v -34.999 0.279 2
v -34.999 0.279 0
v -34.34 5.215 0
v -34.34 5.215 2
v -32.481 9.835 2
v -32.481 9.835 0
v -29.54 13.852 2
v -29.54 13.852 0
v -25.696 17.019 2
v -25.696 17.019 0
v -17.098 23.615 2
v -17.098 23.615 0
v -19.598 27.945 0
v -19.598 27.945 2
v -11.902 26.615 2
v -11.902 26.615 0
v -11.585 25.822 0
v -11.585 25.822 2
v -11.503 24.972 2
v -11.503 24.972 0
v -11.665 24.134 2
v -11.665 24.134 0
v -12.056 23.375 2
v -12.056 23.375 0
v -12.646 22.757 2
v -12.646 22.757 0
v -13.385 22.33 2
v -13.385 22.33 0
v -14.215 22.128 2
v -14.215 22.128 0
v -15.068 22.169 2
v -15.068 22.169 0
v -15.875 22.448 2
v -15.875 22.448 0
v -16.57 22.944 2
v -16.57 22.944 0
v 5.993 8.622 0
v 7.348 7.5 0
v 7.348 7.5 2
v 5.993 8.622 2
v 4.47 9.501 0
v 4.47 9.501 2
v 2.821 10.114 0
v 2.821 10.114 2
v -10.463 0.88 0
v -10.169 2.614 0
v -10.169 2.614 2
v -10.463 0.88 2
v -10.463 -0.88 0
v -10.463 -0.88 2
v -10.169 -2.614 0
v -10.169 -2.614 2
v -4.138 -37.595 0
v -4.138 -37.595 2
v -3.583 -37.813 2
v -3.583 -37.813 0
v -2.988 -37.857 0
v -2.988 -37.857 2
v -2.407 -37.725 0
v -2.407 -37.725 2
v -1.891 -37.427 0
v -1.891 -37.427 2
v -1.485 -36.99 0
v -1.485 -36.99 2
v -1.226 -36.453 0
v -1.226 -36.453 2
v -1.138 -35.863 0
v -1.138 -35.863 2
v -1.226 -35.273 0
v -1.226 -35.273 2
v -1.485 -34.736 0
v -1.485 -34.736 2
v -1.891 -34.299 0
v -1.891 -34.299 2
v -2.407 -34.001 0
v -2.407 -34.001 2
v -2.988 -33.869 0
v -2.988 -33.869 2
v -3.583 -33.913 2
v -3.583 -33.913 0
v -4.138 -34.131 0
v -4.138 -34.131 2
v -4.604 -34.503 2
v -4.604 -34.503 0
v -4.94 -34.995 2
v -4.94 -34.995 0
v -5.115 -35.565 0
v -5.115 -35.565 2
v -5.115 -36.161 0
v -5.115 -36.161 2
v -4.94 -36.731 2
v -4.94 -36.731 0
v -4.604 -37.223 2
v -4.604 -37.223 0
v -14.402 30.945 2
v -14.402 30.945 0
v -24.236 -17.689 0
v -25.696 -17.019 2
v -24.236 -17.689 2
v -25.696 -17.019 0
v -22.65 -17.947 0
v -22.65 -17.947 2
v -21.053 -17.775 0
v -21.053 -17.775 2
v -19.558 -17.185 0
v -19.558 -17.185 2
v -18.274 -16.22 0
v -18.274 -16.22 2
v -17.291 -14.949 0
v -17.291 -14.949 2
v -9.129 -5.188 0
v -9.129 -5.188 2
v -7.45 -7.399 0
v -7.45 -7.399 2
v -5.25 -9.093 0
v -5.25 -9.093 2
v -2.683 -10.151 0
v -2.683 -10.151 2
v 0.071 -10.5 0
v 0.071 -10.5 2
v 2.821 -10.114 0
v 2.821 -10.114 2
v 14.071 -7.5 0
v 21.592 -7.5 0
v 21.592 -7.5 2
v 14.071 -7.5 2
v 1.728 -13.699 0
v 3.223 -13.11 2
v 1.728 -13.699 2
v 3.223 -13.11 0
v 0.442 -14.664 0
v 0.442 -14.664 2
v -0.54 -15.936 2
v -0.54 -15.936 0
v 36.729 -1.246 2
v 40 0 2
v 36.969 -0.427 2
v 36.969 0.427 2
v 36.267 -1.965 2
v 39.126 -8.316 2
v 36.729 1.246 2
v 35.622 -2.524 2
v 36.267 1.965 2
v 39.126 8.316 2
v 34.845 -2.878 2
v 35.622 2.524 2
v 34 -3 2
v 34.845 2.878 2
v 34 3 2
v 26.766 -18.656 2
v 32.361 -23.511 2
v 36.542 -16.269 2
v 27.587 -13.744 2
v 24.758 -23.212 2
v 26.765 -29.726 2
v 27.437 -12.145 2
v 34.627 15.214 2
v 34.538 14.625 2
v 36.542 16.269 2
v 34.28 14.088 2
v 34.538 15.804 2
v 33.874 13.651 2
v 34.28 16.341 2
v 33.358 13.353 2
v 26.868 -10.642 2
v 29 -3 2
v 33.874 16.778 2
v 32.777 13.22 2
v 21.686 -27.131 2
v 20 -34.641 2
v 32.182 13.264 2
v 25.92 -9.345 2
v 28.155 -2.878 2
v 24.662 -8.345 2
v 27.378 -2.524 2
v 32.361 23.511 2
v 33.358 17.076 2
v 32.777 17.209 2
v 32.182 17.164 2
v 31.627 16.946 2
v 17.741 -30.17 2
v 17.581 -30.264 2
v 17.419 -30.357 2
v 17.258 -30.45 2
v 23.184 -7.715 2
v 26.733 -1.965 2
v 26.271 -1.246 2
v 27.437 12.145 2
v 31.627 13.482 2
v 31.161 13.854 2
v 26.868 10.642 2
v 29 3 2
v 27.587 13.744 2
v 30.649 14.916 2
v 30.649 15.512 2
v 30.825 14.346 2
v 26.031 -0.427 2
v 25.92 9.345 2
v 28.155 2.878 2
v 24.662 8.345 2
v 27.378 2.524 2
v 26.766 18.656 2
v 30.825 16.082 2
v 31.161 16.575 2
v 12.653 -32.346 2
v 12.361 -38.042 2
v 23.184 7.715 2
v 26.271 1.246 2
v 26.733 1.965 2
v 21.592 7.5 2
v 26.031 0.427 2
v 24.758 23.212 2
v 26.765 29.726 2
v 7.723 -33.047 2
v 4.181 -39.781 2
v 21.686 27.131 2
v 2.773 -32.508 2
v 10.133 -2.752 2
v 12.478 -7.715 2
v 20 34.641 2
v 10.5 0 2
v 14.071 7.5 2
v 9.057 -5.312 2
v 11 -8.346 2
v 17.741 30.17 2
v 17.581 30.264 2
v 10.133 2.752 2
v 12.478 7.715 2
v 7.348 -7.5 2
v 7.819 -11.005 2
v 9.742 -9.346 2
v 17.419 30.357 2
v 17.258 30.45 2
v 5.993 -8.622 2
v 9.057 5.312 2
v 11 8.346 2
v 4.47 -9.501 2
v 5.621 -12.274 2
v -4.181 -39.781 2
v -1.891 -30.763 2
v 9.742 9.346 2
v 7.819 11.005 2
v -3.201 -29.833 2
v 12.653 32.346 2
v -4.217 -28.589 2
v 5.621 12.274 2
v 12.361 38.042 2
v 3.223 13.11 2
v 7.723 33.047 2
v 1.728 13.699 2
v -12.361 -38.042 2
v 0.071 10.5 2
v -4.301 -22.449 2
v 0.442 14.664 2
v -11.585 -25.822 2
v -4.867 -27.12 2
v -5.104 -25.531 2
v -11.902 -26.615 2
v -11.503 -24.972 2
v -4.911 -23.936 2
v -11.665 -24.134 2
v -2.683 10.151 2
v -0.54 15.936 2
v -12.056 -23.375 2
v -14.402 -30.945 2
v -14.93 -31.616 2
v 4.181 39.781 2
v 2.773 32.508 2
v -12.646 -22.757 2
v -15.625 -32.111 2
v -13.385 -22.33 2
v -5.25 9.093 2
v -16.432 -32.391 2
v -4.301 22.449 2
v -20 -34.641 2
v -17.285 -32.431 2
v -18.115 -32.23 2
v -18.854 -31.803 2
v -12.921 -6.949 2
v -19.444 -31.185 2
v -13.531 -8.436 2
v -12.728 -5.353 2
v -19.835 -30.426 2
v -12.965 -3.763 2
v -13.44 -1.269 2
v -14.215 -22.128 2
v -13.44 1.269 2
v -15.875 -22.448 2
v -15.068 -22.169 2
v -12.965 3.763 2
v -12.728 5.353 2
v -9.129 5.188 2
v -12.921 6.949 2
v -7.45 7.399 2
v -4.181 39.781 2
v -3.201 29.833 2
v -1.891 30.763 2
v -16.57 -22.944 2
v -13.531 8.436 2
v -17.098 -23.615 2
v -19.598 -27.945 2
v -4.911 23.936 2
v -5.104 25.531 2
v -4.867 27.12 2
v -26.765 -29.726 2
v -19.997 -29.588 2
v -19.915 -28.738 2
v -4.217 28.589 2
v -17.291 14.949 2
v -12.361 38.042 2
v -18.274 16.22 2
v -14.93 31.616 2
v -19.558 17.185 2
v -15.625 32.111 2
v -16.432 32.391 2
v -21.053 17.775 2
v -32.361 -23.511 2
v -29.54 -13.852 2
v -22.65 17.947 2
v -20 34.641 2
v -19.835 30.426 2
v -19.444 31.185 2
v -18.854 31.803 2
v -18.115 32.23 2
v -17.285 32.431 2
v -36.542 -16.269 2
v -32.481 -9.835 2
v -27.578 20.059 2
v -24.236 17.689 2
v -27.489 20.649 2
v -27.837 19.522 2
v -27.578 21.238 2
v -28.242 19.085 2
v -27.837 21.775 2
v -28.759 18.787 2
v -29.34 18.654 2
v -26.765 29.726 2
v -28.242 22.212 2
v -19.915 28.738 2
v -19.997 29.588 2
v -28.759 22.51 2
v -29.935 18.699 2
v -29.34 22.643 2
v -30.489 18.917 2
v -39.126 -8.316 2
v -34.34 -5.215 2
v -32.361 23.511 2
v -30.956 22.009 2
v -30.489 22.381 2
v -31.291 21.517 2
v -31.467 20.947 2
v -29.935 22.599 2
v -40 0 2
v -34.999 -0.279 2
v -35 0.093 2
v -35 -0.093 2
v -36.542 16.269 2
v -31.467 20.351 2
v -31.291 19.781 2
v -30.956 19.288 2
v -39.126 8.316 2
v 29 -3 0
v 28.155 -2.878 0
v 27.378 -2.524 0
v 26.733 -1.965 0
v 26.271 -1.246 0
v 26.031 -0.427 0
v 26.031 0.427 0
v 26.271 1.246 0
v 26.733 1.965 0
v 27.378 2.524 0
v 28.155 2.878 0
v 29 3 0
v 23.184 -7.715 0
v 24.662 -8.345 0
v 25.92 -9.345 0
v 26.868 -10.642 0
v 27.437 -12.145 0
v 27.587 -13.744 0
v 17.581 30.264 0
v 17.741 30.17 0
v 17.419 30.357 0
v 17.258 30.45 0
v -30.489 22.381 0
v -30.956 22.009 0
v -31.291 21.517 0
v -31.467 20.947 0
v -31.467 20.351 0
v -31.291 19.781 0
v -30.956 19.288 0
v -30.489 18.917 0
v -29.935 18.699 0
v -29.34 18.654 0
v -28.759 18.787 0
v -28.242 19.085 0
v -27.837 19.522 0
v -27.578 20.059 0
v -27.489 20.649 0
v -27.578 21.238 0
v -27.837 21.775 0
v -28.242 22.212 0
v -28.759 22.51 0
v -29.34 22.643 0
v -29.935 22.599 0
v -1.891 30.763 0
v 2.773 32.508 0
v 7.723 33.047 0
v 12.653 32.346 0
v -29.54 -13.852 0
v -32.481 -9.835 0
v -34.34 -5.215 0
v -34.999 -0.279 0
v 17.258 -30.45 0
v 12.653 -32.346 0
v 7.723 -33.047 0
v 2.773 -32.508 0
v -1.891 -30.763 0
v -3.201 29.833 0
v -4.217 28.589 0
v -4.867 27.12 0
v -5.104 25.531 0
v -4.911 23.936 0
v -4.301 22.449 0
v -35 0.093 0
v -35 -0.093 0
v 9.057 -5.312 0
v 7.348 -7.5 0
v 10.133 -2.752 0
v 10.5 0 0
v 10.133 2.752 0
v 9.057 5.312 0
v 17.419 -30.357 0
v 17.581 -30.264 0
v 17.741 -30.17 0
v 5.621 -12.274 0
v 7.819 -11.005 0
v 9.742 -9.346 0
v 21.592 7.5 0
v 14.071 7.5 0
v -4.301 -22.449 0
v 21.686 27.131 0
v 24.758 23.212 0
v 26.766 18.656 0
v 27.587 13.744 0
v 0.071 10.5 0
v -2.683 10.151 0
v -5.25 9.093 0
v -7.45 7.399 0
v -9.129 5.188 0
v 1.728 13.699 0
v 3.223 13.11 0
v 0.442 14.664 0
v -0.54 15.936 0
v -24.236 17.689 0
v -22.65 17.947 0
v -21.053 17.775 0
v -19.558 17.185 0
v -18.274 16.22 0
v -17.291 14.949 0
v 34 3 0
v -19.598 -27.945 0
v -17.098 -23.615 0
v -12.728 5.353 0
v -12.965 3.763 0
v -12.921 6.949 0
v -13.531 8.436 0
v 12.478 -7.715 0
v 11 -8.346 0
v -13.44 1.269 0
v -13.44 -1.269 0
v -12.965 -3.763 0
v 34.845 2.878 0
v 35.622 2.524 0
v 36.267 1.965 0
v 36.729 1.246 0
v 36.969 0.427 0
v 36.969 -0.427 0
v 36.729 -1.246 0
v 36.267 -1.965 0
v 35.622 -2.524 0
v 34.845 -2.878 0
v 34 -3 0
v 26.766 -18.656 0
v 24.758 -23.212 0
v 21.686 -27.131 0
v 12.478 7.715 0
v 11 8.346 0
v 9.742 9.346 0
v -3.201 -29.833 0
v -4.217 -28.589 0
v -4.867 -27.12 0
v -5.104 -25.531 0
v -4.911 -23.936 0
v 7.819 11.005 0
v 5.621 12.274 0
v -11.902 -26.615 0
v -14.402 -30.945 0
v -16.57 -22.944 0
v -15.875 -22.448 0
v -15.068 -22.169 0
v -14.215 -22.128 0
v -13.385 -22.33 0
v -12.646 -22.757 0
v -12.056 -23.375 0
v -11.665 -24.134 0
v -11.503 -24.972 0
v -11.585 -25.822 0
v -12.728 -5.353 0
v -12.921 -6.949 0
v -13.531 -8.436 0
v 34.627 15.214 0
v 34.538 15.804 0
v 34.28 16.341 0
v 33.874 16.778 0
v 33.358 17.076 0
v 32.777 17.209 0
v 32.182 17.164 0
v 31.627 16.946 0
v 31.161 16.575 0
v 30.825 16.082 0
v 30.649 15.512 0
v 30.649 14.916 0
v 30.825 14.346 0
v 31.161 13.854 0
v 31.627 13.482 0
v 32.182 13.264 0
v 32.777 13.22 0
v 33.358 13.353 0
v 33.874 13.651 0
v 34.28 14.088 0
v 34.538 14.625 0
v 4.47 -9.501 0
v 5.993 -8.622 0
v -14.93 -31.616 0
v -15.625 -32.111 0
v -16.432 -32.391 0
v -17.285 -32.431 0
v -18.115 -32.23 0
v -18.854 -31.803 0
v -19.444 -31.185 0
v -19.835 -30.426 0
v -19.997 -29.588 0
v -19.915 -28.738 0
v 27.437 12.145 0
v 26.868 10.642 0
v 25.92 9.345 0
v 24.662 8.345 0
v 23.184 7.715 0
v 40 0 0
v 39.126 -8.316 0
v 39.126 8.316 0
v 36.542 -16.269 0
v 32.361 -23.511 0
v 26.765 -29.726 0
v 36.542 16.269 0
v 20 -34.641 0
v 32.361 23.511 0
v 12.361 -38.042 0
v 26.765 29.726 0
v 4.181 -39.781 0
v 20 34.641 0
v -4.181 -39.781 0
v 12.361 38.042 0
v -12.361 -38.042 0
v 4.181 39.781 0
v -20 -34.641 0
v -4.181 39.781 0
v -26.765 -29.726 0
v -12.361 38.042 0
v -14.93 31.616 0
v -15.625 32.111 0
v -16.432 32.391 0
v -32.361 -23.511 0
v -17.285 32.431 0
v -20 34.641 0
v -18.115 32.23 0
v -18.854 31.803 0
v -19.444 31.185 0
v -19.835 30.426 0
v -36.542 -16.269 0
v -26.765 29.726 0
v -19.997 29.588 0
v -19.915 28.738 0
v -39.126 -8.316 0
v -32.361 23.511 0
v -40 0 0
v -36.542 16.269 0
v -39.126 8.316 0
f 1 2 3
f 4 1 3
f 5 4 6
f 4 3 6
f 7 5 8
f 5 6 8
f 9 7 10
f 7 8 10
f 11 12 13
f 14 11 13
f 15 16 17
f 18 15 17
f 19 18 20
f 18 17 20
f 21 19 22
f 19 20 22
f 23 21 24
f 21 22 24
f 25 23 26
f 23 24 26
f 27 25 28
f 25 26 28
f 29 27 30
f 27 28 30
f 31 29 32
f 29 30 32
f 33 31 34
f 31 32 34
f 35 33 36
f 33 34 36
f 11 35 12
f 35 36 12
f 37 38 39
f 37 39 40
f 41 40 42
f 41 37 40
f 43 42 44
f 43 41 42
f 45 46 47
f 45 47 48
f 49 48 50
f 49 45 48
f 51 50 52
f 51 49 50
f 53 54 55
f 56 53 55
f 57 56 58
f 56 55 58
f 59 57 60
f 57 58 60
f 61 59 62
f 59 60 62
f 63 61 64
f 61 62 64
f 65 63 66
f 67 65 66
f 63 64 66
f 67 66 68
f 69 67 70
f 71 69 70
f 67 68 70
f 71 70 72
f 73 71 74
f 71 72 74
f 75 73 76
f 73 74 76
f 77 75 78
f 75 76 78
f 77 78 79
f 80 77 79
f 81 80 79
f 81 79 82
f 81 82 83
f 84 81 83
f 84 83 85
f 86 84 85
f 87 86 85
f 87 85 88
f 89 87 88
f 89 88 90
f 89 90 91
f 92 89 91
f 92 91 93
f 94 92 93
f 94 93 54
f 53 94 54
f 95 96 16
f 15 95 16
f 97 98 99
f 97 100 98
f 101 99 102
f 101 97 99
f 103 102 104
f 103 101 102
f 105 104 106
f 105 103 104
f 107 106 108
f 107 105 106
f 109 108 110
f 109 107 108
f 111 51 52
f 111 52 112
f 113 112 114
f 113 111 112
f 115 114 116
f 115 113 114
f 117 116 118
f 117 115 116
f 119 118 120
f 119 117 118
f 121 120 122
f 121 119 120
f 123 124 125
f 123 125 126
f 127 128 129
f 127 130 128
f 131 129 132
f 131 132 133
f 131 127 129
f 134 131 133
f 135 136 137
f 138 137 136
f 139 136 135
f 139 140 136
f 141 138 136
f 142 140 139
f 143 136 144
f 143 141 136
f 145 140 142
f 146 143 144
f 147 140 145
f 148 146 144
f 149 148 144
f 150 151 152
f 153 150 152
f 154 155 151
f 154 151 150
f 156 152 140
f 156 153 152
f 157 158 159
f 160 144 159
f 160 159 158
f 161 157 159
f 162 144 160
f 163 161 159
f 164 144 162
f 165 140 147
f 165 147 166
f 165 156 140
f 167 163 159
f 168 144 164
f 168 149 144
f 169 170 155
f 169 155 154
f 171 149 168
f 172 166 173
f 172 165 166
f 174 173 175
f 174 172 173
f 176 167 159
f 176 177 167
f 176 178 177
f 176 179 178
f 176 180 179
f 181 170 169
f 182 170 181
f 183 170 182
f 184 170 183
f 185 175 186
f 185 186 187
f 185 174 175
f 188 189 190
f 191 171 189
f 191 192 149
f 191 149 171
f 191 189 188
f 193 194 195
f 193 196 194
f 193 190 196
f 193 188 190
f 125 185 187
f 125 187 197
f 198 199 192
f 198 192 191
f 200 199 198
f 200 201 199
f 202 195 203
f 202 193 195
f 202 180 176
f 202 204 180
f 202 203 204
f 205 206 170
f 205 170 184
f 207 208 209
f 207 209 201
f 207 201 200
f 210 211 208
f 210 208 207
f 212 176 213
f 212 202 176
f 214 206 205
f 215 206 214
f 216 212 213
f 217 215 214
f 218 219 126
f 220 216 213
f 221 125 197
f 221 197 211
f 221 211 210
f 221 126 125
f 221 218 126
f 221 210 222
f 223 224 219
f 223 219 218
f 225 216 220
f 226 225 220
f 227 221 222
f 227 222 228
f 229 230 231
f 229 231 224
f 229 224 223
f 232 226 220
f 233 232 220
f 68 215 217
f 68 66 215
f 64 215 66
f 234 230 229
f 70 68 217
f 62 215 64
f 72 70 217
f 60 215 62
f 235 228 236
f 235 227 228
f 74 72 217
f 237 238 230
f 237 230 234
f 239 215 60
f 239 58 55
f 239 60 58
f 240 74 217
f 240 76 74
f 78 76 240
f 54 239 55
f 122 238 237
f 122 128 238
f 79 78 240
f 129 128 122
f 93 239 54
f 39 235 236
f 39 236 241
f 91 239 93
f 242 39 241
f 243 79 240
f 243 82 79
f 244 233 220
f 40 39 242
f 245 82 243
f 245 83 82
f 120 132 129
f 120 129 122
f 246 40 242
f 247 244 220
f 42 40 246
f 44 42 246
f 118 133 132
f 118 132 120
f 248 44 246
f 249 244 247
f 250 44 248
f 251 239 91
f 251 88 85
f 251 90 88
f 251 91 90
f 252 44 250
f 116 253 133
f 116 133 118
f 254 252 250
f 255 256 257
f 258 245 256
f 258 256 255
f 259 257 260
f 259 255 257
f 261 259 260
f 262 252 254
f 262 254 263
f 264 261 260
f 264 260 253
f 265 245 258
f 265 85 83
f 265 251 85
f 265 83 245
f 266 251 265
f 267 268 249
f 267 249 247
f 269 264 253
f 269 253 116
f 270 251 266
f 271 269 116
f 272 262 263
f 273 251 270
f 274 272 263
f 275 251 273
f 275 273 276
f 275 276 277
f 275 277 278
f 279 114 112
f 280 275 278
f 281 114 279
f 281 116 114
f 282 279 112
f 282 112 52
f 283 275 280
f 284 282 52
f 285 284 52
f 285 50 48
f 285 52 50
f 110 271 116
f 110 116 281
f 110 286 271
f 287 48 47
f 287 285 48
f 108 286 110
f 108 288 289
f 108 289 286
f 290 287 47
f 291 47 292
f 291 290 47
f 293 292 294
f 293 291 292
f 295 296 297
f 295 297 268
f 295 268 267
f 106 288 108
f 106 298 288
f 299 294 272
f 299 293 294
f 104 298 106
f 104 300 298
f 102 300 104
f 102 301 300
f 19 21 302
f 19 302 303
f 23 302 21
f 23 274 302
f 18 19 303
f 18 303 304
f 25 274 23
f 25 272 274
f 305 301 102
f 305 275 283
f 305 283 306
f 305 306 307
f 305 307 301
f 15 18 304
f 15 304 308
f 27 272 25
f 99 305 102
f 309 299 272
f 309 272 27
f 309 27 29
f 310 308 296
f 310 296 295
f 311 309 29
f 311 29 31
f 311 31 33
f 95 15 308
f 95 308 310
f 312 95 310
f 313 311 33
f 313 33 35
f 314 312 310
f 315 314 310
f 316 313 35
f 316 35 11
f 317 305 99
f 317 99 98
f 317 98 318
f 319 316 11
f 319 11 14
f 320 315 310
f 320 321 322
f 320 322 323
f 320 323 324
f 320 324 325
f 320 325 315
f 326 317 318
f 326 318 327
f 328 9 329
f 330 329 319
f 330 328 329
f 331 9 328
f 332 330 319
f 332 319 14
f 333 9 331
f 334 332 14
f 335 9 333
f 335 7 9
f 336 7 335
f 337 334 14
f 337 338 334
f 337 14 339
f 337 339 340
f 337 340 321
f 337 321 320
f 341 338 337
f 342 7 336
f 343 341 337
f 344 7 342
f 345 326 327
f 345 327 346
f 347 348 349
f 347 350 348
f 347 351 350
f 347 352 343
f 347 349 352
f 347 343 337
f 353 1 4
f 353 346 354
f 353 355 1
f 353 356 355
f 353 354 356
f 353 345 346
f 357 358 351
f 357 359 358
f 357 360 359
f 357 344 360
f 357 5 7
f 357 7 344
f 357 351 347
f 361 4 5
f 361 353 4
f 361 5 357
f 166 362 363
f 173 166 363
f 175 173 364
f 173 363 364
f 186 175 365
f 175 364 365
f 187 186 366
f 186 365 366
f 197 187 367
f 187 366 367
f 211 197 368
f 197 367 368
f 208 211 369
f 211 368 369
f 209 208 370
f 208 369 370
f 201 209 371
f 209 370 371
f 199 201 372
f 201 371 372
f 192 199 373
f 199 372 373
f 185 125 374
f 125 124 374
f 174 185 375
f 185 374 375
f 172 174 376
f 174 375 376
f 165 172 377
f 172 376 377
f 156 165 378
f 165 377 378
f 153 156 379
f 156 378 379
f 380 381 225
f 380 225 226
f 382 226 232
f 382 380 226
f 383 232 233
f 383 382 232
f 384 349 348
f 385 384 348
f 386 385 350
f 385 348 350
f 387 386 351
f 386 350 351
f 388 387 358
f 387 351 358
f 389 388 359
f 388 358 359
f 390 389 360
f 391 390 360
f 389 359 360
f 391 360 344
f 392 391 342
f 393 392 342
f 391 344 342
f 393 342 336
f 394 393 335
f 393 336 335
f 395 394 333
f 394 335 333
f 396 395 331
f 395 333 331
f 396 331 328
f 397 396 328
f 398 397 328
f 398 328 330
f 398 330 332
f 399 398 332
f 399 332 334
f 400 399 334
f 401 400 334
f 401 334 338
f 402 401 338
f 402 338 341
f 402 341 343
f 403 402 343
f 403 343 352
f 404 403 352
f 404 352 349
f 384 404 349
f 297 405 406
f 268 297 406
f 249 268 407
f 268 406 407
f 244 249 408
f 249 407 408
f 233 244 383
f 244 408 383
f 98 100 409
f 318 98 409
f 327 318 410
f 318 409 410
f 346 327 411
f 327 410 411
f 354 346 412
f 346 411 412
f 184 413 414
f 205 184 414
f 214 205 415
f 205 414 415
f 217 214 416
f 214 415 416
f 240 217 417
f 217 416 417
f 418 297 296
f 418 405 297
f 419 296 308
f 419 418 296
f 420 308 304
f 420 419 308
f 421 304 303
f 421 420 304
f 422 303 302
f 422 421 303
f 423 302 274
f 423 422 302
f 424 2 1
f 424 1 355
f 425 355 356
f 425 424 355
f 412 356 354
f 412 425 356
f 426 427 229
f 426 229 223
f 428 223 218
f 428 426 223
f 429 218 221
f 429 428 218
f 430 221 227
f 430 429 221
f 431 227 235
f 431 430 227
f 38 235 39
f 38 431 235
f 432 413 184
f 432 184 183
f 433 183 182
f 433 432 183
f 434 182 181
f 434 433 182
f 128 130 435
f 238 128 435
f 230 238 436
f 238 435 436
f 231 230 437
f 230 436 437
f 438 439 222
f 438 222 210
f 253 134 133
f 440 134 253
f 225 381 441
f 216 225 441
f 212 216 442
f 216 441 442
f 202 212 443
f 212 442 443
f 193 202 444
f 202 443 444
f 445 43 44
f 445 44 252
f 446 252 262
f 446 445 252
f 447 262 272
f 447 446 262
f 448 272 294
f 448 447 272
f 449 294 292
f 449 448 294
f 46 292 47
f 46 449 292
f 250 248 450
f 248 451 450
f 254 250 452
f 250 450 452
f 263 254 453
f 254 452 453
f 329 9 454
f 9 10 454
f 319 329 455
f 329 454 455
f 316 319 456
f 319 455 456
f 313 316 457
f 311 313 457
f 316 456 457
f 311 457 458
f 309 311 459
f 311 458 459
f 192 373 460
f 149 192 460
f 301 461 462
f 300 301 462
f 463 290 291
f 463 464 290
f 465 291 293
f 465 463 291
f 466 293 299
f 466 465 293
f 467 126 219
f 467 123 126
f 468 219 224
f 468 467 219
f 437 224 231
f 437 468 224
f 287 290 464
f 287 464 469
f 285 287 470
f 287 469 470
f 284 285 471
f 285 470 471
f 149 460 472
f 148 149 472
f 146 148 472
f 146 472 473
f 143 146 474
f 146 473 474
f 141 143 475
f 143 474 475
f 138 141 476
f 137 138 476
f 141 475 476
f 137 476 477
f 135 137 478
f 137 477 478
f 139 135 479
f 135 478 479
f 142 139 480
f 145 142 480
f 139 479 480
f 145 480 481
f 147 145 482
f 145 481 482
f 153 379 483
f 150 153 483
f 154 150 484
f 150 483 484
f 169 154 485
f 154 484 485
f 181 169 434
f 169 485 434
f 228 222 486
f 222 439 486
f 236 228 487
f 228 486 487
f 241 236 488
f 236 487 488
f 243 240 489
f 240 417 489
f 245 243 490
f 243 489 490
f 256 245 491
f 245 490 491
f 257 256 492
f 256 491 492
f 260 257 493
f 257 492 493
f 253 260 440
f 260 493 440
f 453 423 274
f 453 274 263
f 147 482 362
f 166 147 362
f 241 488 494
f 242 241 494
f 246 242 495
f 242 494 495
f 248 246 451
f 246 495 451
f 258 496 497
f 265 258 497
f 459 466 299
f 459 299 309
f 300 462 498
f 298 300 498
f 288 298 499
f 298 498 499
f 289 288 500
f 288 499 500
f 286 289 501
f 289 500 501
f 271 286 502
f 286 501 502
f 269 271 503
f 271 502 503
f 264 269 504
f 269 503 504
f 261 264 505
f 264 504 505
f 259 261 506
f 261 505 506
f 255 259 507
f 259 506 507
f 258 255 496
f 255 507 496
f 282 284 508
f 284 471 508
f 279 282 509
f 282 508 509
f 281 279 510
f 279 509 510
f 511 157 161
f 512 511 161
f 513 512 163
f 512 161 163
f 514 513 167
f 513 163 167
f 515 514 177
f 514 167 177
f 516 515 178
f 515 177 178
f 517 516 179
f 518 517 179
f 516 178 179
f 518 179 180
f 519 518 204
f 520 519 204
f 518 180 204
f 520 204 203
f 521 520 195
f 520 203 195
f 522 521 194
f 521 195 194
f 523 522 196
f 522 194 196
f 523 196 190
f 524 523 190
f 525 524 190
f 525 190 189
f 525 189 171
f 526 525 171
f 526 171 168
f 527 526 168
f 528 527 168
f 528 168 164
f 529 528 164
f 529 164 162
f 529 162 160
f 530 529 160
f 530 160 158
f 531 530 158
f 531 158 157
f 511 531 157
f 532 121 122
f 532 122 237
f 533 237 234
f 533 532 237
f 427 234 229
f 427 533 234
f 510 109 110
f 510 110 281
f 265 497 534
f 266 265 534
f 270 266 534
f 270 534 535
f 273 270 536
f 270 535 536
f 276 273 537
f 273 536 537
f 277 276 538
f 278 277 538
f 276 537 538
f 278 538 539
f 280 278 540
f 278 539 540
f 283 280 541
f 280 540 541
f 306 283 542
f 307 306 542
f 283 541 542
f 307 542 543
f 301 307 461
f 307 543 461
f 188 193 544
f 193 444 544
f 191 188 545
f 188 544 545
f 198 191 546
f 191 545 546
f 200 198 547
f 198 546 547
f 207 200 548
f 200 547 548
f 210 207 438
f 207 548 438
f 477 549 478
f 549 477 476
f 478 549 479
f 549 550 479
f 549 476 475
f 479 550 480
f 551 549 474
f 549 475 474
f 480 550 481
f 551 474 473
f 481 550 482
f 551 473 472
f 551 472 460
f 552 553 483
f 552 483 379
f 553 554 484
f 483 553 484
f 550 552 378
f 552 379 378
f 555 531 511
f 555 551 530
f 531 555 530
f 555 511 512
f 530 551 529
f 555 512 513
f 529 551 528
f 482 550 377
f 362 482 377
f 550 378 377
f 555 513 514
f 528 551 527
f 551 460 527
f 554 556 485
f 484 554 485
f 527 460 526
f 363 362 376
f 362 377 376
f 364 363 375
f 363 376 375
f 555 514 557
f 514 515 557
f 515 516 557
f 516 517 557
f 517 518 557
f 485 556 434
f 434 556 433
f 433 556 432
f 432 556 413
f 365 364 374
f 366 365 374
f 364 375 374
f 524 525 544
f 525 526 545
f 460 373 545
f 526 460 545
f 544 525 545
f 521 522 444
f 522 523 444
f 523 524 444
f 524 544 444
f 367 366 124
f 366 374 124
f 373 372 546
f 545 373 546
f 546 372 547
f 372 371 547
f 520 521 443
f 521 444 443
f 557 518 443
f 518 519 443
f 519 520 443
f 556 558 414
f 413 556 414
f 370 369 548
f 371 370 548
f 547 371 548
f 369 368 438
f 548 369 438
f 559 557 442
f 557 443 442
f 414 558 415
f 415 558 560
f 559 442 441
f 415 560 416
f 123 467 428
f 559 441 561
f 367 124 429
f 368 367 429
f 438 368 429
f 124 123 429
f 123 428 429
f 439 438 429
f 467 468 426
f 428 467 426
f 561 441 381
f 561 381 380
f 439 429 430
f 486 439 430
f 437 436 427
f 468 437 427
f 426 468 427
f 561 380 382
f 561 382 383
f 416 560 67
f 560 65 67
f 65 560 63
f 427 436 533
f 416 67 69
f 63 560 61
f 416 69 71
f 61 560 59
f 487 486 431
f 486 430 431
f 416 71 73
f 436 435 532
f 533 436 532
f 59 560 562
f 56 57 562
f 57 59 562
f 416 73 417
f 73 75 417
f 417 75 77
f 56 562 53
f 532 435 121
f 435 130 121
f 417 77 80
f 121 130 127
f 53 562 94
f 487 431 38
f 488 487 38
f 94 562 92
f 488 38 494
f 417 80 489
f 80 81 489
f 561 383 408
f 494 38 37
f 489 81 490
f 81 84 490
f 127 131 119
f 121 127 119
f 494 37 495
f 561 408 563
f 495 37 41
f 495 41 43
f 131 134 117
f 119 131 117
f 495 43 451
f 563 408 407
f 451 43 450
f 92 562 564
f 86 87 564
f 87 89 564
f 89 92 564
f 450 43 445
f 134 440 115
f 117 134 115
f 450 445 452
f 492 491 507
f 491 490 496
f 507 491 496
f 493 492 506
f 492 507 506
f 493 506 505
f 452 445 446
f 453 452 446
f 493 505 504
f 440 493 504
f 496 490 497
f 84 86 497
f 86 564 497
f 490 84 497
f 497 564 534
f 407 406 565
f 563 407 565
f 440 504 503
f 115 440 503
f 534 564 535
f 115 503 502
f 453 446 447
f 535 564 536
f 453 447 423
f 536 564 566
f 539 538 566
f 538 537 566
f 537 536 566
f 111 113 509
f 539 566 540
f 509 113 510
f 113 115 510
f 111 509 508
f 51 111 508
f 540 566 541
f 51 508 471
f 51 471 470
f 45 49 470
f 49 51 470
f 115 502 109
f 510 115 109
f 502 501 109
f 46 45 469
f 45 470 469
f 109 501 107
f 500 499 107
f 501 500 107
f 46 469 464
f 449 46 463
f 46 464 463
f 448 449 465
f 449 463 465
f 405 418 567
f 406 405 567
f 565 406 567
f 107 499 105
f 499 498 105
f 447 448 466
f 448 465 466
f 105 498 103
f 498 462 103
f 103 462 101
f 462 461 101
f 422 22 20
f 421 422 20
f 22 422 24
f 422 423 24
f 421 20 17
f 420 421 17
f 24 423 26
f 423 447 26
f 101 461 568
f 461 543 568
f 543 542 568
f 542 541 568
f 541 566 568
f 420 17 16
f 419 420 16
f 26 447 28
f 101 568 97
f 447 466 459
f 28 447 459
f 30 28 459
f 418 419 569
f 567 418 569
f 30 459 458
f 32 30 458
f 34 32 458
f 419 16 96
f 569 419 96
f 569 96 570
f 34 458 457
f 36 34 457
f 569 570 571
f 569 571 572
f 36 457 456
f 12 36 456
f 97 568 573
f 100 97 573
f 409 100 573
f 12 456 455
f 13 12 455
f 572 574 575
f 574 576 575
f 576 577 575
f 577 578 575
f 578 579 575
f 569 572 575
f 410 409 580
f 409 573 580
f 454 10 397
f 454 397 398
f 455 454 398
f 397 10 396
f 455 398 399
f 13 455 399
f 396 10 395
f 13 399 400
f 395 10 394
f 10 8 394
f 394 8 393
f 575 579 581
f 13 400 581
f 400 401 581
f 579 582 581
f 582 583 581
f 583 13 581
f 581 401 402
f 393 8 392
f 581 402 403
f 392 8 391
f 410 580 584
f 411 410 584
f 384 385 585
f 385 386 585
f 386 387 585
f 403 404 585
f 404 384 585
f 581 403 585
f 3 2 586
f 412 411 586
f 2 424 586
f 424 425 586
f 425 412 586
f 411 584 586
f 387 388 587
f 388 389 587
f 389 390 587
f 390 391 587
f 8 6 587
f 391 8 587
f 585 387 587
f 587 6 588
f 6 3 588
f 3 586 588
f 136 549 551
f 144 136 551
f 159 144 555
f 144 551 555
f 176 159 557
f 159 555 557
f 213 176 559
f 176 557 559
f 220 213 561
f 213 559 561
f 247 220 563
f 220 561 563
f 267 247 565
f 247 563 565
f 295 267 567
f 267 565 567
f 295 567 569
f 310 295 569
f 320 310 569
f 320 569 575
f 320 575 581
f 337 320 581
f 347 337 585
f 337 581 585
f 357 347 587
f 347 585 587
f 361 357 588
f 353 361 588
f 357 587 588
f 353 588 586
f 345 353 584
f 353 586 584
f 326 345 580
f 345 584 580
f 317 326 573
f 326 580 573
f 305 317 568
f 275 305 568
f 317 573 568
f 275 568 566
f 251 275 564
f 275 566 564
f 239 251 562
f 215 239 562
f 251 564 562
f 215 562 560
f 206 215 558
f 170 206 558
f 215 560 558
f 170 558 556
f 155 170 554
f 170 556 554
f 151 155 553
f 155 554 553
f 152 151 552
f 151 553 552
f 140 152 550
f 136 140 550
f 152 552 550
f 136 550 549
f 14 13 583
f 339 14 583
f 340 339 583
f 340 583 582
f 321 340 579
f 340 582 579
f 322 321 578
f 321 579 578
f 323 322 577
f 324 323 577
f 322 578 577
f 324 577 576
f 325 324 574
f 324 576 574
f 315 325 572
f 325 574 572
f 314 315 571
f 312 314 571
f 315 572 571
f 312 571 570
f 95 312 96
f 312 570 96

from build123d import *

# Parameters (mm, degrees)
SKETCH1_R                = 40
SKETCH1_R_2              = 35
BOSS_EXTRUDE1_DEPTH      = 2
BOSS_EXTRUDE2_DEPTH      = 2
SKETCH3_R                = 3
CUT_EXTRUDE1_DEPTH       = 2
FILLET1_DEPTH            = 2
SKETCH4_R                = 2
CUT_EXTRUDE2_DEPTH       = 10
BOSS_EXTRUDE3_START      = -2
BOSS_EXTRUDE3_DEPTH      = 2
BOSS_EXTRUDE4_START      = -2
SKETCH7_R                = 13.5
SKETCH7_R_2              = 10.5
BOSS_EXTRUDE4_DEPTH      = 2
FILLET2_R                = 6
CIRPATTERN1_COUNT        = 3
FILLET2_OF_CIRPATTERN1_R = 6


with BuildPart() as part:
    # Sketch1 → Boss-Extrude1 (new body)
    with BuildSketch(Plane.XY):
        Circle(SKETCH1_R)
        Circle(SKETCH1_R_2, mode=Mode.SUBTRACT)
    extrude(amount=BOSS_EXTRUDE1_DEPTH)

    # Sketch2 → Boss-Extrude2 (add)
    with BuildSketch(Plane(origin=(0, 0, 0), x_dir=(-1, 0, 0), z_dir=(0, 0, -1))):
        with BuildLine():
            Line((-29, 5), (-34.641016151, 5))
            Line((-34.641016151, 5), (-37.165171868, 5))
            ThreePointArc((-37.165171868, 5), (-37.5, 0), (-37.165171868, -5))
            Line((-37.165171868, -5), (-29, -5))
            ThreePointArc((-29, -5), (-24, 0), (-29, 5))
        make_face()
        with BuildLine():
            Line((-34, -3), (-29, -3))
            ThreePointArc((-29, -3), (-26, 0), (-29, 3))
            Line((-29, 3), (-34, 3))
            ThreePointArc((-34, 3), (-37, 0), (-34, -3))
        make_face(mode=Mode.SUBTRACT)
    boss_extrude2 = extrude(amount=-BOSS_EXTRUDE2_DEPTH)

    # Sketch3 → Cut-Extrude1 (cut)
    with BuildSketch(Plane(origin=(0, 0, 0), x_dir=(-1, 0, 0), z_dir=(0, 0, -1))):
        with Locations((-34, 0)):
            Circle(SKETCH3_R)
    cut_extrude1 = extrude(amount=-CUT_EXTRUDE1_DEPTH, mode=Mode.SUBTRACT)

    # Fillet1: read off the stored shape, not the designer's step
    # Fillet1 outline → Fillet1 (add)
    with BuildSketch(Plane.XY):
        with BuildLine():
            ThreePointArc((29, -5), (26.543386825, -4.354888254), (24.720689655, -2.586020683))
            ThreePointArc((24.720689655, -2.586020683), (26.992450638, -17.835874241), (17.74137931, -30.170241301))
            ThreePointArc((17.74137931, -30.170241301), (29.057943842, -19.509892353), (34.641016151, -5))
            Line((34.641016151, -5), (29, -5))
        make_face()
        with BuildLine():
            ThreePointArc((17.74137931, 30.170241301), (26.992450638, 17.835874241), (24.720689655, 2.586020683))
            ThreePointArc((24.720689655, 2.586020683), (26.543386825, 4.354888254), (29, 5))
            Line((29, 5), (34.641016151, 5))
            ThreePointArc((34.641016151, 5), (29.057943842, 19.509892353), (17.74137931, 30.170241301))
        make_face()
    fillet1 = extrude(amount=FILLET1_DEPTH)

    # Sketch4 → Cut-Extrude2 (cut)
    with BuildSketch(Plane.XY.offset(2)):
        with Locations((32.627080333, 15.214257423)):
            Circle(SKETCH4_R)
    cut_extrude2 = extrude(amount=-CUT_EXTRUDE2_DEPTH, mode=Mode.SUBTRACT)

    # Sketch5 → Boss-Extrude3 (add)
    with BuildSketch(Plane.XY.offset(2).offset(BOSS_EXTRUDE3_START)):
        with BuildLine():
            Line((7.348469228, 7.5), (34.186985828, 7.5))
            ThreePointArc((34.186985828, 7.5), (34.60231879, 5.261134323), (34.871191548, 3))
            Line((34.871191548, 3), (29, 3))
            ThreePointArc((29, 3), (26, 0), (29, -3))
            Line((29, -3), (34.871191548, -3))
            ThreePointArc((34.871191548, -3), (34.60231879, -5.261134323), (34.186985828, -7.5))
            Line((34.186985828, -7.5), (7.348469228, -7.5))
            ThreePointArc((7.348469228, -7.5), (10.5, 0), (7.348469228, 7.5))
        make_face()
    boss_extrude3 = extrude(amount=BOSS_EXTRUDE3_DEPTH)

    # Sketch7 → Boss-Extrude4 (add)
    with BuildSketch(Plane.XY.offset(2).offset(BOSS_EXTRUDE4_START)):
        Circle(SKETCH7_R)
        with Locations(Location((0, 0, 0), (0, 0, 180))):
            Circle(SKETCH7_R_2, mode=Mode.SUBTRACT)
    extrude(amount=BOSS_EXTRUDE4_DEPTH)

    # Fillet2
    fillet2_edges = [part.edges().sort_by_distance(p)[0] for p in [
        (11.22497216, 7.5, 1),
        (11.22497216, -7.5, 1),
        (26.852187894, 7.5, 1),
        (26.852187894, -7.5, 1),
    ]]
    fillet(fillet2_edges, radius=FILLET2_R)

    # CirPattern1: Boss-Extrude2, Cut-Extrude1, Fillet1, Cut-Extrude2, Boss-Extrude3 ×3 about axis
    cirpattern1_axis = Axis((0, 0, 0), (0, 0, 1))
    add([boss_extrude2.rotate(cirpattern1_axis, i * 360 / CIRPATTERN1_COUNT) for i in range(1, CIRPATTERN1_COUNT)])
    add([cut_extrude1.rotate(cirpattern1_axis, i * 360 / CIRPATTERN1_COUNT) for i in range(1, CIRPATTERN1_COUNT)], mode=Mode.SUBTRACT)
    add([fillet1.rotate(cirpattern1_axis, i * 360 / CIRPATTERN1_COUNT) for i in range(1, CIRPATTERN1_COUNT)])
    add([cut_extrude2.rotate(cirpattern1_axis, i * 360 / CIRPATTERN1_COUNT) for i in range(1, CIRPATTERN1_COUNT)], mode=Mode.SUBTRACT)
    add([boss_extrude3.rotate(cirpattern1_axis, i * 360 / CIRPATTERN1_COUNT) for i in range(1, CIRPATTERN1_COUNT)])

    # Fillet2 of CirPattern1
    fillet2_of_cirpattern1_edges = [part.edges().sort_by_distance(p)[0] for p in [
        (-12.107676609, 5.971111048, 1),
        (0.882704448, 13.471111048, 1),
        (-19.921284476, 19.504676864, 1),
        (-6.930903419, 27.004676864, 1),
        (0.882704448, -13.471111048, 1),
        (-12.107676609, -5.971111048, 1),
        (-6.930903419, -27.004676864, 1),
        (-19.921284476, -19.504676864, 1),
    ]]
    fillet(fillet2_of_cirpattern1_edges, radius=FILLET2_OF_CIRPATTERN1_R)


solid = part.part
